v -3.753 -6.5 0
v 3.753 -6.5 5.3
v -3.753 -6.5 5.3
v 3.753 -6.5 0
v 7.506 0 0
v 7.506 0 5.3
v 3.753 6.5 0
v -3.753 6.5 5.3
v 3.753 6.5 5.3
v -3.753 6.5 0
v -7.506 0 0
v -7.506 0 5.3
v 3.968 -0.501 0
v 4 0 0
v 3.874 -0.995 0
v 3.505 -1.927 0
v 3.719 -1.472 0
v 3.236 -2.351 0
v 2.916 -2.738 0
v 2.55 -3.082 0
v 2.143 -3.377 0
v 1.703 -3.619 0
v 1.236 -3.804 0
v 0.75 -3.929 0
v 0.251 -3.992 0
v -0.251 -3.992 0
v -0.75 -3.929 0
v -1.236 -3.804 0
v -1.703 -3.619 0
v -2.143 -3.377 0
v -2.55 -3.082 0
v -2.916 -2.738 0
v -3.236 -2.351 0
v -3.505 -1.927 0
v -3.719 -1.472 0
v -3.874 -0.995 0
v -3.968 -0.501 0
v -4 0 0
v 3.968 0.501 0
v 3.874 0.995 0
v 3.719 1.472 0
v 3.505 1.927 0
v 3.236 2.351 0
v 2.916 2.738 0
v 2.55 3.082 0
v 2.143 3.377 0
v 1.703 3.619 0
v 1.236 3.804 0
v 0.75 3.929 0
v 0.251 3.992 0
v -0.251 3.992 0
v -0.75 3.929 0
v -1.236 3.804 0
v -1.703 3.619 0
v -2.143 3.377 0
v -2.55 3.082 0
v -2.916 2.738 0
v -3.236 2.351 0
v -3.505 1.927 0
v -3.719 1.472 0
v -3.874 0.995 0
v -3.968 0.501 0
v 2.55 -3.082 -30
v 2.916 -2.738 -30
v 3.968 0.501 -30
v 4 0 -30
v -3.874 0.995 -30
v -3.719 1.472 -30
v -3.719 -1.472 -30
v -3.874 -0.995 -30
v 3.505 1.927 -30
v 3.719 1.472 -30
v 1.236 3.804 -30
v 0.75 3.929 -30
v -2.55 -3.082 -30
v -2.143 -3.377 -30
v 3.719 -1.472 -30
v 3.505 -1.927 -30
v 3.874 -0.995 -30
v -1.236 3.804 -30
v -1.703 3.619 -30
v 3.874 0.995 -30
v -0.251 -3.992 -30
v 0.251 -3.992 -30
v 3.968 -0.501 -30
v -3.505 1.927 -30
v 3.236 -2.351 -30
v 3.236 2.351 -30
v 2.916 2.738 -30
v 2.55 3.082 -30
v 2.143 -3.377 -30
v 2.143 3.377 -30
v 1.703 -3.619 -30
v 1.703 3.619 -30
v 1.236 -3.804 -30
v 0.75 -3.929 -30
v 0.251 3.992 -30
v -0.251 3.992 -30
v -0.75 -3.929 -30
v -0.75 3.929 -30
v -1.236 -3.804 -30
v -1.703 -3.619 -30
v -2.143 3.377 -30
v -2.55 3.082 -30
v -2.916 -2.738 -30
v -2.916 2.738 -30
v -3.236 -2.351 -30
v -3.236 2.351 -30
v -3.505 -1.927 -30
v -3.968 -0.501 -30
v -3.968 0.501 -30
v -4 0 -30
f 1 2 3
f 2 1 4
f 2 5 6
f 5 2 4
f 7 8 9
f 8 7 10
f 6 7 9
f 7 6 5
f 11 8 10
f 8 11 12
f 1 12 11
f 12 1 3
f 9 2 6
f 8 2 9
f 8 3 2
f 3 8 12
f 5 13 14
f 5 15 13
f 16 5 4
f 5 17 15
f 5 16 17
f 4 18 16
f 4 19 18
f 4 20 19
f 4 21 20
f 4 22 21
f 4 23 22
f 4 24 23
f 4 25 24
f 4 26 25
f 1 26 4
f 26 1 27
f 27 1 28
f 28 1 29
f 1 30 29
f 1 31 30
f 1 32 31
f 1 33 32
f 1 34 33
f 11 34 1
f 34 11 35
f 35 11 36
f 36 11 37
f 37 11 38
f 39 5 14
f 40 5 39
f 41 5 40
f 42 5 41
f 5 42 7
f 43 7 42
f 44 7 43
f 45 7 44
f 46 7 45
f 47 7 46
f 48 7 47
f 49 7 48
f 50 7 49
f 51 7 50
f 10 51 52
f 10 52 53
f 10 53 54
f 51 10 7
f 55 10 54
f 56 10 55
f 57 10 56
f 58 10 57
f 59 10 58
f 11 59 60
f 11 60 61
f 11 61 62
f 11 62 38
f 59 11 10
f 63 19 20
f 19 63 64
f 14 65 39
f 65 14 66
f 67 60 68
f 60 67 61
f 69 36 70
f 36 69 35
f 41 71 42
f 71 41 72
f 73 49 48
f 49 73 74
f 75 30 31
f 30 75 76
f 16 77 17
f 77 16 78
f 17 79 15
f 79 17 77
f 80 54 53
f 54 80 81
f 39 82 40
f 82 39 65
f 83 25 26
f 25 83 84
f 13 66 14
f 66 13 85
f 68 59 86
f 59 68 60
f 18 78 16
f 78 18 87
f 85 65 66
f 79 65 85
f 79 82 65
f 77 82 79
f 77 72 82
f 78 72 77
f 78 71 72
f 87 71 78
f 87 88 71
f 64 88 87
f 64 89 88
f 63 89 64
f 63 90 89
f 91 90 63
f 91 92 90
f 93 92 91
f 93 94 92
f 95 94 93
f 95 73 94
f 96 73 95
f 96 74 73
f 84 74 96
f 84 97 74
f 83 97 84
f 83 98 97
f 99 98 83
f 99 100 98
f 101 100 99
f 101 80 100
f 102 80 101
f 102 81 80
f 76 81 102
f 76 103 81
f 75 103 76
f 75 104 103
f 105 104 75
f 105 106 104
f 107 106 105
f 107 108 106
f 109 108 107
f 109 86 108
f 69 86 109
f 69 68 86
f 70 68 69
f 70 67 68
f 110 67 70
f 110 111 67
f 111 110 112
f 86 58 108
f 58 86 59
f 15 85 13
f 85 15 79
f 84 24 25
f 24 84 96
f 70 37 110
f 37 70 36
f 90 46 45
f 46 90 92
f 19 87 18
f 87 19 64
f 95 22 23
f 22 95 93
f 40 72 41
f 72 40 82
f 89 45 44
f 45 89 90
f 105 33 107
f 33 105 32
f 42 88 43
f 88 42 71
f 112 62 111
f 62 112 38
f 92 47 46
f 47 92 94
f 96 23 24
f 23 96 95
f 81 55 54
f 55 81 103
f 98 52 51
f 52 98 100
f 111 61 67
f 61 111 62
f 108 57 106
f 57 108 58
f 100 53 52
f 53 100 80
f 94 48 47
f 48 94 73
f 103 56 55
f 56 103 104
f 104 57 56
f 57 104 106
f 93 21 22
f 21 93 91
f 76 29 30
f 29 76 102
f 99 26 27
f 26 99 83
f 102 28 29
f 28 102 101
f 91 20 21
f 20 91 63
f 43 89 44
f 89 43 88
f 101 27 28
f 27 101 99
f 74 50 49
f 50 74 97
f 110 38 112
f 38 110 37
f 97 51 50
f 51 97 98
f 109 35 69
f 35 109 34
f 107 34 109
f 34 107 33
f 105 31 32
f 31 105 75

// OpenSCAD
// M8 Hex Bolt
// 寸法：二面幅13mm、頭部高さ5.3mm、シャンク径8mm、長さ30mm
// 配置：頭部底面が z=0、シャンクが z<0 方向

head_af = 13;
head_height = 5.3;
shank_dia = 8;
shank_len = 30;

// cylinder(..., $fn=6) を使用する場合の半径 r = (二面幅 / 2) / cos(180/6)
// つまり r = (head_af / 2) / (sqrt(3)/2) = head_af / sqrt(3)
hex_radius = head_af / sqrt(3);

union() {
    // 頭部: z=0 から z=5.3 まで
    cylinder(r = hex_radius, h = head_height, $fn = 6);
    
    // シャンク: z=0 から z=-30 まで
    translate([0, 0, -shank_len])
        cylinder(d = shank_dia, h = shank_len, $fn = 50);
}
